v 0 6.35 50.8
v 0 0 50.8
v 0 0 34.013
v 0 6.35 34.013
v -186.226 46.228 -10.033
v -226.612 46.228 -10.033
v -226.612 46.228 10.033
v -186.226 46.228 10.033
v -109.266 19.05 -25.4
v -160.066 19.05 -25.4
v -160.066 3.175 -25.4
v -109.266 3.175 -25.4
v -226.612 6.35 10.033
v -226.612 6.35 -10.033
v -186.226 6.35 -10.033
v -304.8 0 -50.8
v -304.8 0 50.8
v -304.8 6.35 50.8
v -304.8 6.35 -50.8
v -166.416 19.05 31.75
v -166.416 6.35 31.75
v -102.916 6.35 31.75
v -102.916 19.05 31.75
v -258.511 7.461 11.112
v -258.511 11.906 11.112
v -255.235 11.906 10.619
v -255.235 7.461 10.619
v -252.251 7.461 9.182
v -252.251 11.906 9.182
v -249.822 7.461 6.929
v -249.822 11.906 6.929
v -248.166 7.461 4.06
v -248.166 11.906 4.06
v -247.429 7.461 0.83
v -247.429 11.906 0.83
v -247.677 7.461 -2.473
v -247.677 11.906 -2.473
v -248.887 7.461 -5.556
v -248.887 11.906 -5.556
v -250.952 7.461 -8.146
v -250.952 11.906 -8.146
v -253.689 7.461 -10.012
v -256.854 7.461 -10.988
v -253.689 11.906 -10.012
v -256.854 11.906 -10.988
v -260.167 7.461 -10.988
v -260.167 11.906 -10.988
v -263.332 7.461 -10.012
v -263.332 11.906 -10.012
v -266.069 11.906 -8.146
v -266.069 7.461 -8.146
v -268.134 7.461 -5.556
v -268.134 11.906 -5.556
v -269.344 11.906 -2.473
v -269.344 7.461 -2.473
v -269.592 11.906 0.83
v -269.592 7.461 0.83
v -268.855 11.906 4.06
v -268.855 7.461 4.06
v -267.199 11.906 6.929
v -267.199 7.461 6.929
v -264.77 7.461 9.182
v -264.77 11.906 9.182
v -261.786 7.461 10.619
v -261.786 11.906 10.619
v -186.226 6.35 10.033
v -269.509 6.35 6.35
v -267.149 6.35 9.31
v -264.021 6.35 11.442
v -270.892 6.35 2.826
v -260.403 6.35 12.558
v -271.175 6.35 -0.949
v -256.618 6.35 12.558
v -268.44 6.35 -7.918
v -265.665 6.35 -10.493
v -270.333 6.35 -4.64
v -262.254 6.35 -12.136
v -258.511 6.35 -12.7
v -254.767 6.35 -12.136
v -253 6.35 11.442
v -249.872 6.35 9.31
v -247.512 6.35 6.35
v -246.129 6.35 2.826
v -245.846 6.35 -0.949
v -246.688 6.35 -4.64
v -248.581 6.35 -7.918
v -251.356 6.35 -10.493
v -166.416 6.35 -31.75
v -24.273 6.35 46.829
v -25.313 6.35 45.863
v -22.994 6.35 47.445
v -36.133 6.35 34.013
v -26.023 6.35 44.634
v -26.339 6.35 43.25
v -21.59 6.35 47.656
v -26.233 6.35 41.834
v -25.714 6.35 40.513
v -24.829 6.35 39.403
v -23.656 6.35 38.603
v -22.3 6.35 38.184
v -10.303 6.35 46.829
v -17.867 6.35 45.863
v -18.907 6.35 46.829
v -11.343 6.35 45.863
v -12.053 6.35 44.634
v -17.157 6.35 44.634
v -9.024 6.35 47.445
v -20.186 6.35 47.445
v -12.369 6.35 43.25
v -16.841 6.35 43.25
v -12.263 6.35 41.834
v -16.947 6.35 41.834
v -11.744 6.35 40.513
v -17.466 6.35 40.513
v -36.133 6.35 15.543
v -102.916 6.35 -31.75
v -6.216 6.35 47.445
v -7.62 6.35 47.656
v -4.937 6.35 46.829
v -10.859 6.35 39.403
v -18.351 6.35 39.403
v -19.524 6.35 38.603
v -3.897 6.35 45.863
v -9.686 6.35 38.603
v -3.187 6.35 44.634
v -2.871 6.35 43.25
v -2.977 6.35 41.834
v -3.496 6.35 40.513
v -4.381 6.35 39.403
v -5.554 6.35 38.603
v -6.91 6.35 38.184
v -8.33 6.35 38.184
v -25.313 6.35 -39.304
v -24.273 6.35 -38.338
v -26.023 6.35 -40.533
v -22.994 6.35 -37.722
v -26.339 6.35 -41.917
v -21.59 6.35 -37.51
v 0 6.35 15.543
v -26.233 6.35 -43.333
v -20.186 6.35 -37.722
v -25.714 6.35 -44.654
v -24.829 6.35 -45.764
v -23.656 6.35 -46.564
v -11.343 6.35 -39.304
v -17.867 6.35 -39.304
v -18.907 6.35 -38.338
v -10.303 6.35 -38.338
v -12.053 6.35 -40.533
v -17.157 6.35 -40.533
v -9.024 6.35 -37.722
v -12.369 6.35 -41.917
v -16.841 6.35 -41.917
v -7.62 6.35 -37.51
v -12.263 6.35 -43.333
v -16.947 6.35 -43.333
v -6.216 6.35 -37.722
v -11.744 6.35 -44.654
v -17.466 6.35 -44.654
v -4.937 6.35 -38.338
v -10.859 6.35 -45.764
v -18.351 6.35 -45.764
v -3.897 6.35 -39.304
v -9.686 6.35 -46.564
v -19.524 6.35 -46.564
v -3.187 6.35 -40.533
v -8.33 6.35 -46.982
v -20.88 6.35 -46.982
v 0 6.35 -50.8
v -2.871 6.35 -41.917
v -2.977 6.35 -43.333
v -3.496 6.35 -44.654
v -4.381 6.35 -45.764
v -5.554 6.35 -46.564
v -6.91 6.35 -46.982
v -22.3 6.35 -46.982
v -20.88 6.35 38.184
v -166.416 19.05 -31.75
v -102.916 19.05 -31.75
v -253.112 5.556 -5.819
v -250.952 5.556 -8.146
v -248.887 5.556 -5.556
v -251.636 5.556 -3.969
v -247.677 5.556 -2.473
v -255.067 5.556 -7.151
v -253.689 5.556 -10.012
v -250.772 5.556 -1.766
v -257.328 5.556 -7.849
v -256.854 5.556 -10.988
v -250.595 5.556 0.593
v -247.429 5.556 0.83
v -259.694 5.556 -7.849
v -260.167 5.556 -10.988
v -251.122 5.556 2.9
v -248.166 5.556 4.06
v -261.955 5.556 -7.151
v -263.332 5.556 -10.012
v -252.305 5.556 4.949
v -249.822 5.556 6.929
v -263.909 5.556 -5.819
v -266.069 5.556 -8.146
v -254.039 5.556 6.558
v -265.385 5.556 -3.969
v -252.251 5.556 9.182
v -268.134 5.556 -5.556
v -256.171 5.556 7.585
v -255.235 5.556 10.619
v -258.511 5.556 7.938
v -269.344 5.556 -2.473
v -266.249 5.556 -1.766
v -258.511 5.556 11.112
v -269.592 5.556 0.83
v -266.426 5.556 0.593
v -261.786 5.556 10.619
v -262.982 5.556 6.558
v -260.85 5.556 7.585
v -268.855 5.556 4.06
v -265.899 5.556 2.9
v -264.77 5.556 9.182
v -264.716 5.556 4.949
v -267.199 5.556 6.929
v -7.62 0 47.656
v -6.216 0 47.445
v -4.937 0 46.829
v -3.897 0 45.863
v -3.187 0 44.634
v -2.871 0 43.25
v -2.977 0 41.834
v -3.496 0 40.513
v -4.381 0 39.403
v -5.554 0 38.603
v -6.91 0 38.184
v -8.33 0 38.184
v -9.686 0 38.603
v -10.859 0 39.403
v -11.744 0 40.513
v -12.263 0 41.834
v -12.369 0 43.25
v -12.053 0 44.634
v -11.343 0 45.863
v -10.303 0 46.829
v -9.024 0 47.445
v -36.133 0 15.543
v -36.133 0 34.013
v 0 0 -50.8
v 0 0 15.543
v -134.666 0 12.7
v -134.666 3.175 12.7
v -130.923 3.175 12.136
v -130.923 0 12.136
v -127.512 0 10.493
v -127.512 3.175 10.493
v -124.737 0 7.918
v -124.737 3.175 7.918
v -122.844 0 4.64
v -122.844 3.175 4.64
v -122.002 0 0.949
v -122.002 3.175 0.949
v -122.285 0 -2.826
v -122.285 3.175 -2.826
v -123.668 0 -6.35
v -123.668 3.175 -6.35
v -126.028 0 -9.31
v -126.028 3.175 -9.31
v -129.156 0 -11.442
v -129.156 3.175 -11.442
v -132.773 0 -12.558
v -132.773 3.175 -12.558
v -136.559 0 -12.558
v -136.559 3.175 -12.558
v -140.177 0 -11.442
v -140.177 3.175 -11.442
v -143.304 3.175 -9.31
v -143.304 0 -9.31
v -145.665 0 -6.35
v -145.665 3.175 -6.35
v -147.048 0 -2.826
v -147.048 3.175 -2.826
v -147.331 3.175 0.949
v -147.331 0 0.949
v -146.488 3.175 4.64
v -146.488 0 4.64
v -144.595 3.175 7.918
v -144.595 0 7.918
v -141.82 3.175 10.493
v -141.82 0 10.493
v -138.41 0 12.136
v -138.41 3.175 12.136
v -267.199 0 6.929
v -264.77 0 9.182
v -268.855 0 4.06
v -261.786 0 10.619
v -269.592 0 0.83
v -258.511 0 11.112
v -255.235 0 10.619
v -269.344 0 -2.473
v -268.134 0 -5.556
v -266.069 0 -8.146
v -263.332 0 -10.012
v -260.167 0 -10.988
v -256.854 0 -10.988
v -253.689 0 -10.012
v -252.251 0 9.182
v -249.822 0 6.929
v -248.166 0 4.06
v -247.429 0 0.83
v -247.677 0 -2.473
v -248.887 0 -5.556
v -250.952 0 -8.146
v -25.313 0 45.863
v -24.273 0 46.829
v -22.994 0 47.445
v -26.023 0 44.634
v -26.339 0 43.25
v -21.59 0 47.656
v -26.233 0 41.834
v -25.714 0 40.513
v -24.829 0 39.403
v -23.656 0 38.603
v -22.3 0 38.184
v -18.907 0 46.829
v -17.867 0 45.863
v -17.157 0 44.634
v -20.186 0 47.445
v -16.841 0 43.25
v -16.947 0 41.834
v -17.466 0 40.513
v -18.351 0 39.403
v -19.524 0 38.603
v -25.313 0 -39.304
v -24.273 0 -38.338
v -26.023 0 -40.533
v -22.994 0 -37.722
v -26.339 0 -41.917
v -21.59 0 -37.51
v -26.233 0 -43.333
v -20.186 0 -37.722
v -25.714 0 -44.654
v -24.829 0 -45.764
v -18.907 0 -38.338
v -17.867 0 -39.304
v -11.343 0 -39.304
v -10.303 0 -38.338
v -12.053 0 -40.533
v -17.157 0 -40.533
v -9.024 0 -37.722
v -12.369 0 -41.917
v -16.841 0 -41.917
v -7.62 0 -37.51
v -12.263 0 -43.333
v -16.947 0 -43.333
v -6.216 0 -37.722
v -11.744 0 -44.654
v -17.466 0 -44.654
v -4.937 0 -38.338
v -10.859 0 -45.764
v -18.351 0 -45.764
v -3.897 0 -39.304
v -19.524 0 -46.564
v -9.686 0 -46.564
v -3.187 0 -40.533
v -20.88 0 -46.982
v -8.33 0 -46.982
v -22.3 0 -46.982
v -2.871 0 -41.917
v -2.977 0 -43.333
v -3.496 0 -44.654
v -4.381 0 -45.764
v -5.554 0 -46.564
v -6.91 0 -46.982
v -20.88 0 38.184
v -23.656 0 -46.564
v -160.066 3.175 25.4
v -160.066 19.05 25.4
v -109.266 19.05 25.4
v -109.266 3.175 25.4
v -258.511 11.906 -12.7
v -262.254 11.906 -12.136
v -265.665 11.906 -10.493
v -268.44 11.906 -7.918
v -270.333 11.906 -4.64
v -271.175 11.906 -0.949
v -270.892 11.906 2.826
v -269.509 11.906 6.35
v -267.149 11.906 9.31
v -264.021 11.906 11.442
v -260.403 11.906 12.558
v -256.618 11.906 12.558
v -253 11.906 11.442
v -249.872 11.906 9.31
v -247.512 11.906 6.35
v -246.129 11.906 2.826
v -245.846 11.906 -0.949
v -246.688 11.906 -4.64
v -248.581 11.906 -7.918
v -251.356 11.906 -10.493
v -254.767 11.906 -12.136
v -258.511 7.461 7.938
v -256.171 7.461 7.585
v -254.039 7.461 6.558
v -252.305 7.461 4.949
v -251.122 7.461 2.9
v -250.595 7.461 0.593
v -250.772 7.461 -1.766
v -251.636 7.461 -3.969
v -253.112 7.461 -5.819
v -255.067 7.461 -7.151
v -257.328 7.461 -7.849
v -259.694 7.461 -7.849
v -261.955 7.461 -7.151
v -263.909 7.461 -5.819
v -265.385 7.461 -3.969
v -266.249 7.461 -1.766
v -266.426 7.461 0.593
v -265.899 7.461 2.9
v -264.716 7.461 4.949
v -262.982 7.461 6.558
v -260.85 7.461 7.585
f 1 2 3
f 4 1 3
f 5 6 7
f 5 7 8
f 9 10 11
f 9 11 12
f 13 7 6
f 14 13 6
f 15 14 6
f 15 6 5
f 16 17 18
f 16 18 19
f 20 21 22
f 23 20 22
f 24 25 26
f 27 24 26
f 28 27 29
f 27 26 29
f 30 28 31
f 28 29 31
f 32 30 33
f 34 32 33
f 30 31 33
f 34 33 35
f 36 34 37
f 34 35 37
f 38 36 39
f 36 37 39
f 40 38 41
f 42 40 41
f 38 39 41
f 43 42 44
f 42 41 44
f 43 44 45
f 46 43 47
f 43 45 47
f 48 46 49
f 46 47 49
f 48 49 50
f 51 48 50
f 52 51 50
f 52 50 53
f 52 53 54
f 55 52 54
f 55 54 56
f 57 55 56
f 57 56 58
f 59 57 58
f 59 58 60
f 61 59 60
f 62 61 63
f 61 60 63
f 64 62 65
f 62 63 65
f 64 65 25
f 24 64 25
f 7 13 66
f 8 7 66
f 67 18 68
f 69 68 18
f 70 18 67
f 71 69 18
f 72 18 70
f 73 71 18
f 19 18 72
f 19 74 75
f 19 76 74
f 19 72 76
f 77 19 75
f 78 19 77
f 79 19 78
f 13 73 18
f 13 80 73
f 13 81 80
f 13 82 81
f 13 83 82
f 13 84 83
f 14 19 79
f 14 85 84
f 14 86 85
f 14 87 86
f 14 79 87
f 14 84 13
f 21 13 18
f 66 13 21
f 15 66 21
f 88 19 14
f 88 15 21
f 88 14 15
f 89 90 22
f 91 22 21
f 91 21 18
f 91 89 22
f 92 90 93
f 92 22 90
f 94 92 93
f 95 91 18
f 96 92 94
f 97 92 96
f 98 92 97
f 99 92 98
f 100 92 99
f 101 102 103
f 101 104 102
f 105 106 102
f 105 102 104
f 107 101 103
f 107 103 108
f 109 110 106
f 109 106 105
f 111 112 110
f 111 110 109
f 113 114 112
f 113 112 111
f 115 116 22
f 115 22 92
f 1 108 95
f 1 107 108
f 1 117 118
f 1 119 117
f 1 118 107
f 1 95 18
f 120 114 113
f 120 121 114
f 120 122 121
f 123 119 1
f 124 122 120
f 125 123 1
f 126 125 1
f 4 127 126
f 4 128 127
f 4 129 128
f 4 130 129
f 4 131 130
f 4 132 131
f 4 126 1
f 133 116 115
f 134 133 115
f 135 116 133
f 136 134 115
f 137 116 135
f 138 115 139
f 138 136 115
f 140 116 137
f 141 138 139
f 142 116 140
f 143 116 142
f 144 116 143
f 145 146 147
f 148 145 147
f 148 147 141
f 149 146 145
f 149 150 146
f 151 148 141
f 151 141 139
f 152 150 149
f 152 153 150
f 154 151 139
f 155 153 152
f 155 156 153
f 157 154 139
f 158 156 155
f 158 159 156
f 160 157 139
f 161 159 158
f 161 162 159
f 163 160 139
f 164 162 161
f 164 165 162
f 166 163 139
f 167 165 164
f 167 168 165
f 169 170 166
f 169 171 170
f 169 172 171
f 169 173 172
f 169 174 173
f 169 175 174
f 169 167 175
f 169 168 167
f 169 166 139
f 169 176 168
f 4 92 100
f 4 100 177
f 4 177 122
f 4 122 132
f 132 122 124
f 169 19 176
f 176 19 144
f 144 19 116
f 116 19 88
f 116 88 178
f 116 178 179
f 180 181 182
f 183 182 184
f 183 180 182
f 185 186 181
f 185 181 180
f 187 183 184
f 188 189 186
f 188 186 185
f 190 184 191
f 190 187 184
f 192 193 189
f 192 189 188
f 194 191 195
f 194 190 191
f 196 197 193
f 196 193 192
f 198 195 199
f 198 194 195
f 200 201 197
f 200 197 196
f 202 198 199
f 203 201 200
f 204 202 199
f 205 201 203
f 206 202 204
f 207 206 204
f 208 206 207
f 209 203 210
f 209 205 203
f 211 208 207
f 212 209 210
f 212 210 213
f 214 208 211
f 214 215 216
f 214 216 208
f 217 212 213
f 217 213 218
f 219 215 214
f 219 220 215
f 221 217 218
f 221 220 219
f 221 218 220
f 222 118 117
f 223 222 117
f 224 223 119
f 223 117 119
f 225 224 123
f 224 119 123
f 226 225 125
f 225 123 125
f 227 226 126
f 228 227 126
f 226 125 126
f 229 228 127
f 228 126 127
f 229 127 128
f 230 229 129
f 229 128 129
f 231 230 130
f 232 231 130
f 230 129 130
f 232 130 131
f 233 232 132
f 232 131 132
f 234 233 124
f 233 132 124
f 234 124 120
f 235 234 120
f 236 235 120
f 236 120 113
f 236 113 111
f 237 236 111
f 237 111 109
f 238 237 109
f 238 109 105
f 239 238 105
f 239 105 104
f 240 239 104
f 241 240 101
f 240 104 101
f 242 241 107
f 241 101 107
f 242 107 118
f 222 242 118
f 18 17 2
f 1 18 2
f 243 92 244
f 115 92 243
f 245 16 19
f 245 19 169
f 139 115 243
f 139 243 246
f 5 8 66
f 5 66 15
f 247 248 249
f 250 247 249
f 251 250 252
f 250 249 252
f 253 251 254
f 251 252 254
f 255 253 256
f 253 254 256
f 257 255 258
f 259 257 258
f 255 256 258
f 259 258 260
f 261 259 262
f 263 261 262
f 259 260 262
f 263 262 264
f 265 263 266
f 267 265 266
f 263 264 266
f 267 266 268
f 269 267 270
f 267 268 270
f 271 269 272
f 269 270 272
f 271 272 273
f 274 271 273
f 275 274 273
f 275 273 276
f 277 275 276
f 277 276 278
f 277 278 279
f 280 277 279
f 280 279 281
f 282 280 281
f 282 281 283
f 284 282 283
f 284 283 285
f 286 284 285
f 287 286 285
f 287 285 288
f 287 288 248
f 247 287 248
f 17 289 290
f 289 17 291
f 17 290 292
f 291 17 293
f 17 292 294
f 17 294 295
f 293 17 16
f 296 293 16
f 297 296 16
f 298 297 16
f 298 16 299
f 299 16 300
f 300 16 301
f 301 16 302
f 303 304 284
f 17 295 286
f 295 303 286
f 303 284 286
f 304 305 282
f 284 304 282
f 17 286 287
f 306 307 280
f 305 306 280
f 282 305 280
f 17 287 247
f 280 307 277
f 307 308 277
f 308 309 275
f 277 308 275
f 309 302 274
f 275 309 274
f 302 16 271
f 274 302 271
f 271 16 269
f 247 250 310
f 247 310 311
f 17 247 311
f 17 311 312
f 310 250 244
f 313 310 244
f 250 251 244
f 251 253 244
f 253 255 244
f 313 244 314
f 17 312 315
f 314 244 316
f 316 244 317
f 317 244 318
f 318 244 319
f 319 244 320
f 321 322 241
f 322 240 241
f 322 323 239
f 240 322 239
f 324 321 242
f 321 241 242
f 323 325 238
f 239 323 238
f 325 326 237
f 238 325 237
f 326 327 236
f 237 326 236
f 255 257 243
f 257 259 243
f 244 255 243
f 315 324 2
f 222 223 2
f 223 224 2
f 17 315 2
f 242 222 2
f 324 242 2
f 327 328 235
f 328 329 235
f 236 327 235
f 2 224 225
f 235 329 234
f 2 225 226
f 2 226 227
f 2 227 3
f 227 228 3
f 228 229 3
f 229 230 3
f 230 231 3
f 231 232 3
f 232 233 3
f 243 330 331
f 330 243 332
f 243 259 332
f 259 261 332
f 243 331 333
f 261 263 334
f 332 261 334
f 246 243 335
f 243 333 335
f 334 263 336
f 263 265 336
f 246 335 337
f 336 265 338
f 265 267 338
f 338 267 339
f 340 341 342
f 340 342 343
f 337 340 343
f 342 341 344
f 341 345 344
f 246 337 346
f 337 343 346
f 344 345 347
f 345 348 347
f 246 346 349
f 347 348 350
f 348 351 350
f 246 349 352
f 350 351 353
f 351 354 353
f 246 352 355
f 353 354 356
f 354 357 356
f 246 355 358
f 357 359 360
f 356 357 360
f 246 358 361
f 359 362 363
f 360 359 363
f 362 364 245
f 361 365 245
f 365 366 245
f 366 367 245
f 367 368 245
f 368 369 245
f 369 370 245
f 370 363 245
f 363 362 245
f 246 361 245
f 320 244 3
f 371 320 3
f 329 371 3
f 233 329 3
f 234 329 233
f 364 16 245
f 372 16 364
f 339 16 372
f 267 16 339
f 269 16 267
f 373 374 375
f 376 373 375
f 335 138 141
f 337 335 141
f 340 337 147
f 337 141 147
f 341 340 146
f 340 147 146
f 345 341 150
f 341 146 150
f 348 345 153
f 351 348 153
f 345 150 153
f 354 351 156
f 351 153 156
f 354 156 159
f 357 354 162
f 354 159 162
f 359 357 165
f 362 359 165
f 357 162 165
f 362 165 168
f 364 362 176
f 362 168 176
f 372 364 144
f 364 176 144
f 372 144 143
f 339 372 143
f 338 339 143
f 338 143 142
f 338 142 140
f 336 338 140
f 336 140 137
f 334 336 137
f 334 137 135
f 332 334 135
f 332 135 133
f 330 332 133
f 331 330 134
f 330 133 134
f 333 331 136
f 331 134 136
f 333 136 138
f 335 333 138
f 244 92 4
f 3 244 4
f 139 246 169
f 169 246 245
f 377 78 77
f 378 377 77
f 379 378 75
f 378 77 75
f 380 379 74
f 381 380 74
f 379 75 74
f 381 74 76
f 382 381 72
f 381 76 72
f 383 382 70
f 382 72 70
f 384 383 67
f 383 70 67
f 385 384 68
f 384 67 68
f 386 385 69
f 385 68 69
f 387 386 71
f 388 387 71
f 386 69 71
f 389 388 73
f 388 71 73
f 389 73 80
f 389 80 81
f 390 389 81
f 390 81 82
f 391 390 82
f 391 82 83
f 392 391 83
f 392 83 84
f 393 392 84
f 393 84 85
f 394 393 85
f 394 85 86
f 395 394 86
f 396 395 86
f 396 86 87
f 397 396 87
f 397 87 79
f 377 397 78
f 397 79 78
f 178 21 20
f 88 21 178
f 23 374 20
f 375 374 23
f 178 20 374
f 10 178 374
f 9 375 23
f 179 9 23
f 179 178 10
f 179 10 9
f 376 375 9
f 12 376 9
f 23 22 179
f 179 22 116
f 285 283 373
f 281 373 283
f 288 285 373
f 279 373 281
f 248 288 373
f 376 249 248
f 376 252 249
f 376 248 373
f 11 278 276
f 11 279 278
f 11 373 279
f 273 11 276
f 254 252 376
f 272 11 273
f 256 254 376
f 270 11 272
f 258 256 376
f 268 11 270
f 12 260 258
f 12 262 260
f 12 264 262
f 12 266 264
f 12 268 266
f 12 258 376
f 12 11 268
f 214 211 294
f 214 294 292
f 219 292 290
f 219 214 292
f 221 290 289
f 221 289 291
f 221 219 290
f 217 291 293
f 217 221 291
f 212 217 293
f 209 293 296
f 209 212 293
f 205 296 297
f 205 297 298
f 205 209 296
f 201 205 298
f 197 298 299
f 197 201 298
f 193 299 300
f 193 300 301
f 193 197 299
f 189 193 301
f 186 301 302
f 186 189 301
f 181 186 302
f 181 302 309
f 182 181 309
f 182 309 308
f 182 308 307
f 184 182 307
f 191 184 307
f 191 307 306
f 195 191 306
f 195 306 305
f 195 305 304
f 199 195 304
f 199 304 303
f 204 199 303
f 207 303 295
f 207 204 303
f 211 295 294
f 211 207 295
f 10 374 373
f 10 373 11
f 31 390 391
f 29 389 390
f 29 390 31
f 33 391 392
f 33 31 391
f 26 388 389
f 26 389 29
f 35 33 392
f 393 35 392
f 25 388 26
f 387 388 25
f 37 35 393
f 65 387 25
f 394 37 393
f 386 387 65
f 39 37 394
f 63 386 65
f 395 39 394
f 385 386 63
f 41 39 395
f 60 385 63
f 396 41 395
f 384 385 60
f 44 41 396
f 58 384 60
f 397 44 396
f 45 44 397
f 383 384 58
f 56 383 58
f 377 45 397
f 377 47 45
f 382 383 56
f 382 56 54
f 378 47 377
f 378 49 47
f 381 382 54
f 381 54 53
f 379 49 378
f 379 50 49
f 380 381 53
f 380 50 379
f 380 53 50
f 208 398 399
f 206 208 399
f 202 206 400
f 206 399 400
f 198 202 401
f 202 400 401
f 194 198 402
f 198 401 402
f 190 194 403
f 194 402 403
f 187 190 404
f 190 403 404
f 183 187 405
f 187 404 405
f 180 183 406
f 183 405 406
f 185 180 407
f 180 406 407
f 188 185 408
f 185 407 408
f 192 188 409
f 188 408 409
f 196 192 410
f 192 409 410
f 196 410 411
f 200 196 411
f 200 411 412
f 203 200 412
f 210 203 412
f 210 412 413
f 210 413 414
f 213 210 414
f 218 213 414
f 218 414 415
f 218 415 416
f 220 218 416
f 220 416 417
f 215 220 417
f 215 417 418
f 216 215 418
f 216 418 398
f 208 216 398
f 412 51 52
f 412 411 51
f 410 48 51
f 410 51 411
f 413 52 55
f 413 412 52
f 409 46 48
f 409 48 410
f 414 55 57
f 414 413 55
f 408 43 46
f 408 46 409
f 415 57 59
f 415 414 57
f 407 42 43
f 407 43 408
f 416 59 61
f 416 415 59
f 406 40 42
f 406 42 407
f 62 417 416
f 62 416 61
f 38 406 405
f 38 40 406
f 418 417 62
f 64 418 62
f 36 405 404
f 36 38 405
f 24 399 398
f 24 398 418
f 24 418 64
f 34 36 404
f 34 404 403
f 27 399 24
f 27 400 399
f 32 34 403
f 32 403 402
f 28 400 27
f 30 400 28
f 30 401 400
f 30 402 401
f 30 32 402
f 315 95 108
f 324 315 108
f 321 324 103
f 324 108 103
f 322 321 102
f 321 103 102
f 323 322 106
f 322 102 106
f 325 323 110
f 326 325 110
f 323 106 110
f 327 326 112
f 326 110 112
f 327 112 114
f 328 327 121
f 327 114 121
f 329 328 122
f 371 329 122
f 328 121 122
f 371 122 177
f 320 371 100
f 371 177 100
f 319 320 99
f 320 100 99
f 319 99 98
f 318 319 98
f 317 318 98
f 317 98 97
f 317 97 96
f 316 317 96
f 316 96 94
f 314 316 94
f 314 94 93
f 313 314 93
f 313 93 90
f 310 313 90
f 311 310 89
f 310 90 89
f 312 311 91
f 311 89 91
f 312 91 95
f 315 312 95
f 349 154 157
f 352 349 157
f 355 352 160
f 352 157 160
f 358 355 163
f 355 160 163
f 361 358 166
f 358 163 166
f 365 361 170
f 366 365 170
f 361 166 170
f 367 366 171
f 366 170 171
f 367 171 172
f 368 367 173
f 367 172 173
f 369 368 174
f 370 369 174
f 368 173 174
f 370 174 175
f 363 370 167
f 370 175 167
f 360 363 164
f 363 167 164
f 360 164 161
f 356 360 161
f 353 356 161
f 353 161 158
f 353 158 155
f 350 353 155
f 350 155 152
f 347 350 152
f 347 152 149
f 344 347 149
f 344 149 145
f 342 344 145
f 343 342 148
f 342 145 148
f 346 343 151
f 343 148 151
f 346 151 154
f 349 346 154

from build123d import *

# Parameters (mm, degrees)
SKETCH1_W           = 304.8
SKETCH1_H           = 101.6
BOSS_EXTRUDE1_DEPTH = 6.35
SKETCH2_R           = 12.7
BOSS_EXTRUDE3_DEPTH = 5.55625
SKETCH9_R           = 11.1125
CUT_EXTRUDE4_DEPTH  = 4.445
CUT_EXTRUDE5_START  = -5.55625
SKETCH10_R          = 11.1125
CUT_EXTRUDE5_DEPTH  = 5.55625
SKETCH11_R          = 7.9375
CUT_EXTRUDE6_DEPTH  = 310.094403462
SKETCH12_R          = 12.7
CUT_EXTRUDE7_DEPTH  = 310.0695755
SKETCH22_W          = 63.5
SKETCH22_H          = 63.5
BOSS_EXTRUDE7_DEPTH = 12.7
SKETCH25_W          = 50.8
SKETCH25_H          = 50.8
CUT_EXTRUDE11_DEPTH = 15.875
SKETCH18_W          = 40.386
SKETCH18_H          = 20.066
BOSS_EXTRUDE5_DEPTH = 39.878
SKETCH32_R          = 4.7625
CUT_EXTRUDE12_DEPTH = 6.35
SKETCH34_W          = 36.133088602
SKETCH34_H          = 18.470251096
CUT_EXTRUDE13_DEPTH = 312.566902742


with BuildPart() as part:
    # Sketch1 → Boss-Extrude1 (new body)
    with BuildSketch(Plane(origin=(0, 0, 0), x_dir=(1, 0, 0), z_dir=(0, 1, 0))):
        with Locations((-152.4, 0)):
            Rectangle(SKETCH1_W, SKETCH1_H)
    extrude(amount=BOSS_EXTRUDE1_DEPTH)

    # Sketch2 → Boss-Extrude3 (add)
    with BuildSketch(Plane(origin=(0, 6.35, 0), x_dir=(1, 0, 0), z_dir=(0, 1, 0))):
        with Locations(Location((-258.510557857, 0, 0), (0, 0, 90))):
            Circle(SKETCH2_R)
    extrude(amount=BOSS_EXTRUDE3_DEPTH)

    # Sketch9 → Cut-Extrude4 (cut)
    with BuildSketch(Plane(origin=(0, 11.90625, 0), x_dir=(1, 0, 0), z_dir=(0, 1, 0))):
        with Locations(Location((-258.510557857, 0, 0), (0, 0, 270))):
            Circle(SKETCH9_R)
    extrude(amount=-CUT_EXTRUDE4_DEPTH, mode=Mode.SUBTRACT)

    # Sketch10 → Cut-Extrude5 (cut)
    with BuildSketch(Plane(origin=(0, 0, 0), x_dir=(-1, 0, 0), z_dir=(0, -1, 0)).offset(CUT_EXTRUDE5_START)):
        with Locations(Location((258.510557857, 0, 0), (0, 0, 270))):
            Circle(SKETCH10_R)
    extrude(amount=CUT_EXTRUDE5_DEPTH, mode=Mode.SUBTRACT)

    # Sketch11 → Cut-Extrude6 (cut, through all)
    with BuildSketch(Plane(origin=(0, 7.46125, 0), x_dir=(1, 0, 0), z_dir=(0, 1, 0))):
        with Locations(Location((-258.510557857, 0, 0), (0, 0, 270))):
            Circle(SKETCH11_R)
    extrude(amount=-CUT_EXTRUDE6_DEPTH, mode=Mode.SUBTRACT)

    # Sketch12 → Cut-Extrude7 (cut, through all)
    with BuildSketch(Plane(origin=(0, 6.35, 0), x_dir=(1, 0, 0), z_dir=(0, 1, 0))):
        with Locations(Location((-134.666203771, 0, 0), (0, 0, 270))):
            Circle(SKETCH12_R)
    extrude(amount=-CUT_EXTRUDE7_DEPTH, mode=Mode.SUBTRACT)

    # Sketch22 → Boss-Extrude7 (add)
    with BuildSketch(Plane(origin=(0, 6.35, 0), x_dir=(1, 0, 0), z_dir=(0, 1, 0))):
        with Locations((-134.666203771, 0)):
            Rectangle(SKETCH22_W, SKETCH22_H)
    extrude(amount=BOSS_EXTRUDE7_DEPTH)

    # Sketch25 → Cut-Extrude11 (cut)
    with BuildSketch(Plane(origin=(0, 19.05, 0), x_dir=(1, 0, 0), z_dir=(0, 1, 0))):
        with Locations((-134.666203771, 0)):
            Rectangle(SKETCH25_W, SKETCH25_H)
    extrude(amount=-CUT_EXTRUDE11_DEPTH, mode=Mode.SUBTRACT)

    # Sketch18 → Boss-Extrude5 (add)
    with BuildSketch(Plane(origin=(0, 6.35, 0), x_dir=(1, 0, 0), z_dir=(0, 1, 0))):
        with Locations((-206.419013169, 0)):
            Rectangle(SKETCH18_W, SKETCH18_H)
    extrude(amount=BOSS_EXTRUDE5_DEPTH)

    # Sketch32 → Cut-Extrude12 (cut)
    with BuildSketch(Plane(origin=(0, 6.35, 0), x_dir=(1, 0, 0), z_dir=(0, 1, 0))):
        with Locations(Location((-7.62, -42.893773539, 0), (0, 0, 270))):
            Circle(SKETCH32_R)
        with Locations(Location((-21.59, -42.893773539, 0), (0, 0, 270))):
            Circle(SKETCH32_R)
        with Locations(Location((-7.62, 42.272941973, 0), (0, 0, 270))):
            Circle(SKETCH32_R)
        with Locations(Location((-21.59, 42.272941973, 0), (0, 0, 270))):
            Circle(SKETCH32_R)
    extrude(amount=-CUT_EXTRUDE12_DEPTH, mode=Mode.SUBTRACT)

    # Sketch34 → Cut-Extrude13 (cut, through all)
    with BuildSketch(Plane(origin=(0, 6.35, 0), x_dir=(1, 0, 0), z_dir=(0, 1, 0))):
        with Locations((-18.066544301, -24.7777)):
            Rectangle(SKETCH34_W, SKETCH34_H)
    extrude(amount=-CUT_EXTRUDE13_DEPTH, mode=Mode.SUBTRACT)


solid = part.part
